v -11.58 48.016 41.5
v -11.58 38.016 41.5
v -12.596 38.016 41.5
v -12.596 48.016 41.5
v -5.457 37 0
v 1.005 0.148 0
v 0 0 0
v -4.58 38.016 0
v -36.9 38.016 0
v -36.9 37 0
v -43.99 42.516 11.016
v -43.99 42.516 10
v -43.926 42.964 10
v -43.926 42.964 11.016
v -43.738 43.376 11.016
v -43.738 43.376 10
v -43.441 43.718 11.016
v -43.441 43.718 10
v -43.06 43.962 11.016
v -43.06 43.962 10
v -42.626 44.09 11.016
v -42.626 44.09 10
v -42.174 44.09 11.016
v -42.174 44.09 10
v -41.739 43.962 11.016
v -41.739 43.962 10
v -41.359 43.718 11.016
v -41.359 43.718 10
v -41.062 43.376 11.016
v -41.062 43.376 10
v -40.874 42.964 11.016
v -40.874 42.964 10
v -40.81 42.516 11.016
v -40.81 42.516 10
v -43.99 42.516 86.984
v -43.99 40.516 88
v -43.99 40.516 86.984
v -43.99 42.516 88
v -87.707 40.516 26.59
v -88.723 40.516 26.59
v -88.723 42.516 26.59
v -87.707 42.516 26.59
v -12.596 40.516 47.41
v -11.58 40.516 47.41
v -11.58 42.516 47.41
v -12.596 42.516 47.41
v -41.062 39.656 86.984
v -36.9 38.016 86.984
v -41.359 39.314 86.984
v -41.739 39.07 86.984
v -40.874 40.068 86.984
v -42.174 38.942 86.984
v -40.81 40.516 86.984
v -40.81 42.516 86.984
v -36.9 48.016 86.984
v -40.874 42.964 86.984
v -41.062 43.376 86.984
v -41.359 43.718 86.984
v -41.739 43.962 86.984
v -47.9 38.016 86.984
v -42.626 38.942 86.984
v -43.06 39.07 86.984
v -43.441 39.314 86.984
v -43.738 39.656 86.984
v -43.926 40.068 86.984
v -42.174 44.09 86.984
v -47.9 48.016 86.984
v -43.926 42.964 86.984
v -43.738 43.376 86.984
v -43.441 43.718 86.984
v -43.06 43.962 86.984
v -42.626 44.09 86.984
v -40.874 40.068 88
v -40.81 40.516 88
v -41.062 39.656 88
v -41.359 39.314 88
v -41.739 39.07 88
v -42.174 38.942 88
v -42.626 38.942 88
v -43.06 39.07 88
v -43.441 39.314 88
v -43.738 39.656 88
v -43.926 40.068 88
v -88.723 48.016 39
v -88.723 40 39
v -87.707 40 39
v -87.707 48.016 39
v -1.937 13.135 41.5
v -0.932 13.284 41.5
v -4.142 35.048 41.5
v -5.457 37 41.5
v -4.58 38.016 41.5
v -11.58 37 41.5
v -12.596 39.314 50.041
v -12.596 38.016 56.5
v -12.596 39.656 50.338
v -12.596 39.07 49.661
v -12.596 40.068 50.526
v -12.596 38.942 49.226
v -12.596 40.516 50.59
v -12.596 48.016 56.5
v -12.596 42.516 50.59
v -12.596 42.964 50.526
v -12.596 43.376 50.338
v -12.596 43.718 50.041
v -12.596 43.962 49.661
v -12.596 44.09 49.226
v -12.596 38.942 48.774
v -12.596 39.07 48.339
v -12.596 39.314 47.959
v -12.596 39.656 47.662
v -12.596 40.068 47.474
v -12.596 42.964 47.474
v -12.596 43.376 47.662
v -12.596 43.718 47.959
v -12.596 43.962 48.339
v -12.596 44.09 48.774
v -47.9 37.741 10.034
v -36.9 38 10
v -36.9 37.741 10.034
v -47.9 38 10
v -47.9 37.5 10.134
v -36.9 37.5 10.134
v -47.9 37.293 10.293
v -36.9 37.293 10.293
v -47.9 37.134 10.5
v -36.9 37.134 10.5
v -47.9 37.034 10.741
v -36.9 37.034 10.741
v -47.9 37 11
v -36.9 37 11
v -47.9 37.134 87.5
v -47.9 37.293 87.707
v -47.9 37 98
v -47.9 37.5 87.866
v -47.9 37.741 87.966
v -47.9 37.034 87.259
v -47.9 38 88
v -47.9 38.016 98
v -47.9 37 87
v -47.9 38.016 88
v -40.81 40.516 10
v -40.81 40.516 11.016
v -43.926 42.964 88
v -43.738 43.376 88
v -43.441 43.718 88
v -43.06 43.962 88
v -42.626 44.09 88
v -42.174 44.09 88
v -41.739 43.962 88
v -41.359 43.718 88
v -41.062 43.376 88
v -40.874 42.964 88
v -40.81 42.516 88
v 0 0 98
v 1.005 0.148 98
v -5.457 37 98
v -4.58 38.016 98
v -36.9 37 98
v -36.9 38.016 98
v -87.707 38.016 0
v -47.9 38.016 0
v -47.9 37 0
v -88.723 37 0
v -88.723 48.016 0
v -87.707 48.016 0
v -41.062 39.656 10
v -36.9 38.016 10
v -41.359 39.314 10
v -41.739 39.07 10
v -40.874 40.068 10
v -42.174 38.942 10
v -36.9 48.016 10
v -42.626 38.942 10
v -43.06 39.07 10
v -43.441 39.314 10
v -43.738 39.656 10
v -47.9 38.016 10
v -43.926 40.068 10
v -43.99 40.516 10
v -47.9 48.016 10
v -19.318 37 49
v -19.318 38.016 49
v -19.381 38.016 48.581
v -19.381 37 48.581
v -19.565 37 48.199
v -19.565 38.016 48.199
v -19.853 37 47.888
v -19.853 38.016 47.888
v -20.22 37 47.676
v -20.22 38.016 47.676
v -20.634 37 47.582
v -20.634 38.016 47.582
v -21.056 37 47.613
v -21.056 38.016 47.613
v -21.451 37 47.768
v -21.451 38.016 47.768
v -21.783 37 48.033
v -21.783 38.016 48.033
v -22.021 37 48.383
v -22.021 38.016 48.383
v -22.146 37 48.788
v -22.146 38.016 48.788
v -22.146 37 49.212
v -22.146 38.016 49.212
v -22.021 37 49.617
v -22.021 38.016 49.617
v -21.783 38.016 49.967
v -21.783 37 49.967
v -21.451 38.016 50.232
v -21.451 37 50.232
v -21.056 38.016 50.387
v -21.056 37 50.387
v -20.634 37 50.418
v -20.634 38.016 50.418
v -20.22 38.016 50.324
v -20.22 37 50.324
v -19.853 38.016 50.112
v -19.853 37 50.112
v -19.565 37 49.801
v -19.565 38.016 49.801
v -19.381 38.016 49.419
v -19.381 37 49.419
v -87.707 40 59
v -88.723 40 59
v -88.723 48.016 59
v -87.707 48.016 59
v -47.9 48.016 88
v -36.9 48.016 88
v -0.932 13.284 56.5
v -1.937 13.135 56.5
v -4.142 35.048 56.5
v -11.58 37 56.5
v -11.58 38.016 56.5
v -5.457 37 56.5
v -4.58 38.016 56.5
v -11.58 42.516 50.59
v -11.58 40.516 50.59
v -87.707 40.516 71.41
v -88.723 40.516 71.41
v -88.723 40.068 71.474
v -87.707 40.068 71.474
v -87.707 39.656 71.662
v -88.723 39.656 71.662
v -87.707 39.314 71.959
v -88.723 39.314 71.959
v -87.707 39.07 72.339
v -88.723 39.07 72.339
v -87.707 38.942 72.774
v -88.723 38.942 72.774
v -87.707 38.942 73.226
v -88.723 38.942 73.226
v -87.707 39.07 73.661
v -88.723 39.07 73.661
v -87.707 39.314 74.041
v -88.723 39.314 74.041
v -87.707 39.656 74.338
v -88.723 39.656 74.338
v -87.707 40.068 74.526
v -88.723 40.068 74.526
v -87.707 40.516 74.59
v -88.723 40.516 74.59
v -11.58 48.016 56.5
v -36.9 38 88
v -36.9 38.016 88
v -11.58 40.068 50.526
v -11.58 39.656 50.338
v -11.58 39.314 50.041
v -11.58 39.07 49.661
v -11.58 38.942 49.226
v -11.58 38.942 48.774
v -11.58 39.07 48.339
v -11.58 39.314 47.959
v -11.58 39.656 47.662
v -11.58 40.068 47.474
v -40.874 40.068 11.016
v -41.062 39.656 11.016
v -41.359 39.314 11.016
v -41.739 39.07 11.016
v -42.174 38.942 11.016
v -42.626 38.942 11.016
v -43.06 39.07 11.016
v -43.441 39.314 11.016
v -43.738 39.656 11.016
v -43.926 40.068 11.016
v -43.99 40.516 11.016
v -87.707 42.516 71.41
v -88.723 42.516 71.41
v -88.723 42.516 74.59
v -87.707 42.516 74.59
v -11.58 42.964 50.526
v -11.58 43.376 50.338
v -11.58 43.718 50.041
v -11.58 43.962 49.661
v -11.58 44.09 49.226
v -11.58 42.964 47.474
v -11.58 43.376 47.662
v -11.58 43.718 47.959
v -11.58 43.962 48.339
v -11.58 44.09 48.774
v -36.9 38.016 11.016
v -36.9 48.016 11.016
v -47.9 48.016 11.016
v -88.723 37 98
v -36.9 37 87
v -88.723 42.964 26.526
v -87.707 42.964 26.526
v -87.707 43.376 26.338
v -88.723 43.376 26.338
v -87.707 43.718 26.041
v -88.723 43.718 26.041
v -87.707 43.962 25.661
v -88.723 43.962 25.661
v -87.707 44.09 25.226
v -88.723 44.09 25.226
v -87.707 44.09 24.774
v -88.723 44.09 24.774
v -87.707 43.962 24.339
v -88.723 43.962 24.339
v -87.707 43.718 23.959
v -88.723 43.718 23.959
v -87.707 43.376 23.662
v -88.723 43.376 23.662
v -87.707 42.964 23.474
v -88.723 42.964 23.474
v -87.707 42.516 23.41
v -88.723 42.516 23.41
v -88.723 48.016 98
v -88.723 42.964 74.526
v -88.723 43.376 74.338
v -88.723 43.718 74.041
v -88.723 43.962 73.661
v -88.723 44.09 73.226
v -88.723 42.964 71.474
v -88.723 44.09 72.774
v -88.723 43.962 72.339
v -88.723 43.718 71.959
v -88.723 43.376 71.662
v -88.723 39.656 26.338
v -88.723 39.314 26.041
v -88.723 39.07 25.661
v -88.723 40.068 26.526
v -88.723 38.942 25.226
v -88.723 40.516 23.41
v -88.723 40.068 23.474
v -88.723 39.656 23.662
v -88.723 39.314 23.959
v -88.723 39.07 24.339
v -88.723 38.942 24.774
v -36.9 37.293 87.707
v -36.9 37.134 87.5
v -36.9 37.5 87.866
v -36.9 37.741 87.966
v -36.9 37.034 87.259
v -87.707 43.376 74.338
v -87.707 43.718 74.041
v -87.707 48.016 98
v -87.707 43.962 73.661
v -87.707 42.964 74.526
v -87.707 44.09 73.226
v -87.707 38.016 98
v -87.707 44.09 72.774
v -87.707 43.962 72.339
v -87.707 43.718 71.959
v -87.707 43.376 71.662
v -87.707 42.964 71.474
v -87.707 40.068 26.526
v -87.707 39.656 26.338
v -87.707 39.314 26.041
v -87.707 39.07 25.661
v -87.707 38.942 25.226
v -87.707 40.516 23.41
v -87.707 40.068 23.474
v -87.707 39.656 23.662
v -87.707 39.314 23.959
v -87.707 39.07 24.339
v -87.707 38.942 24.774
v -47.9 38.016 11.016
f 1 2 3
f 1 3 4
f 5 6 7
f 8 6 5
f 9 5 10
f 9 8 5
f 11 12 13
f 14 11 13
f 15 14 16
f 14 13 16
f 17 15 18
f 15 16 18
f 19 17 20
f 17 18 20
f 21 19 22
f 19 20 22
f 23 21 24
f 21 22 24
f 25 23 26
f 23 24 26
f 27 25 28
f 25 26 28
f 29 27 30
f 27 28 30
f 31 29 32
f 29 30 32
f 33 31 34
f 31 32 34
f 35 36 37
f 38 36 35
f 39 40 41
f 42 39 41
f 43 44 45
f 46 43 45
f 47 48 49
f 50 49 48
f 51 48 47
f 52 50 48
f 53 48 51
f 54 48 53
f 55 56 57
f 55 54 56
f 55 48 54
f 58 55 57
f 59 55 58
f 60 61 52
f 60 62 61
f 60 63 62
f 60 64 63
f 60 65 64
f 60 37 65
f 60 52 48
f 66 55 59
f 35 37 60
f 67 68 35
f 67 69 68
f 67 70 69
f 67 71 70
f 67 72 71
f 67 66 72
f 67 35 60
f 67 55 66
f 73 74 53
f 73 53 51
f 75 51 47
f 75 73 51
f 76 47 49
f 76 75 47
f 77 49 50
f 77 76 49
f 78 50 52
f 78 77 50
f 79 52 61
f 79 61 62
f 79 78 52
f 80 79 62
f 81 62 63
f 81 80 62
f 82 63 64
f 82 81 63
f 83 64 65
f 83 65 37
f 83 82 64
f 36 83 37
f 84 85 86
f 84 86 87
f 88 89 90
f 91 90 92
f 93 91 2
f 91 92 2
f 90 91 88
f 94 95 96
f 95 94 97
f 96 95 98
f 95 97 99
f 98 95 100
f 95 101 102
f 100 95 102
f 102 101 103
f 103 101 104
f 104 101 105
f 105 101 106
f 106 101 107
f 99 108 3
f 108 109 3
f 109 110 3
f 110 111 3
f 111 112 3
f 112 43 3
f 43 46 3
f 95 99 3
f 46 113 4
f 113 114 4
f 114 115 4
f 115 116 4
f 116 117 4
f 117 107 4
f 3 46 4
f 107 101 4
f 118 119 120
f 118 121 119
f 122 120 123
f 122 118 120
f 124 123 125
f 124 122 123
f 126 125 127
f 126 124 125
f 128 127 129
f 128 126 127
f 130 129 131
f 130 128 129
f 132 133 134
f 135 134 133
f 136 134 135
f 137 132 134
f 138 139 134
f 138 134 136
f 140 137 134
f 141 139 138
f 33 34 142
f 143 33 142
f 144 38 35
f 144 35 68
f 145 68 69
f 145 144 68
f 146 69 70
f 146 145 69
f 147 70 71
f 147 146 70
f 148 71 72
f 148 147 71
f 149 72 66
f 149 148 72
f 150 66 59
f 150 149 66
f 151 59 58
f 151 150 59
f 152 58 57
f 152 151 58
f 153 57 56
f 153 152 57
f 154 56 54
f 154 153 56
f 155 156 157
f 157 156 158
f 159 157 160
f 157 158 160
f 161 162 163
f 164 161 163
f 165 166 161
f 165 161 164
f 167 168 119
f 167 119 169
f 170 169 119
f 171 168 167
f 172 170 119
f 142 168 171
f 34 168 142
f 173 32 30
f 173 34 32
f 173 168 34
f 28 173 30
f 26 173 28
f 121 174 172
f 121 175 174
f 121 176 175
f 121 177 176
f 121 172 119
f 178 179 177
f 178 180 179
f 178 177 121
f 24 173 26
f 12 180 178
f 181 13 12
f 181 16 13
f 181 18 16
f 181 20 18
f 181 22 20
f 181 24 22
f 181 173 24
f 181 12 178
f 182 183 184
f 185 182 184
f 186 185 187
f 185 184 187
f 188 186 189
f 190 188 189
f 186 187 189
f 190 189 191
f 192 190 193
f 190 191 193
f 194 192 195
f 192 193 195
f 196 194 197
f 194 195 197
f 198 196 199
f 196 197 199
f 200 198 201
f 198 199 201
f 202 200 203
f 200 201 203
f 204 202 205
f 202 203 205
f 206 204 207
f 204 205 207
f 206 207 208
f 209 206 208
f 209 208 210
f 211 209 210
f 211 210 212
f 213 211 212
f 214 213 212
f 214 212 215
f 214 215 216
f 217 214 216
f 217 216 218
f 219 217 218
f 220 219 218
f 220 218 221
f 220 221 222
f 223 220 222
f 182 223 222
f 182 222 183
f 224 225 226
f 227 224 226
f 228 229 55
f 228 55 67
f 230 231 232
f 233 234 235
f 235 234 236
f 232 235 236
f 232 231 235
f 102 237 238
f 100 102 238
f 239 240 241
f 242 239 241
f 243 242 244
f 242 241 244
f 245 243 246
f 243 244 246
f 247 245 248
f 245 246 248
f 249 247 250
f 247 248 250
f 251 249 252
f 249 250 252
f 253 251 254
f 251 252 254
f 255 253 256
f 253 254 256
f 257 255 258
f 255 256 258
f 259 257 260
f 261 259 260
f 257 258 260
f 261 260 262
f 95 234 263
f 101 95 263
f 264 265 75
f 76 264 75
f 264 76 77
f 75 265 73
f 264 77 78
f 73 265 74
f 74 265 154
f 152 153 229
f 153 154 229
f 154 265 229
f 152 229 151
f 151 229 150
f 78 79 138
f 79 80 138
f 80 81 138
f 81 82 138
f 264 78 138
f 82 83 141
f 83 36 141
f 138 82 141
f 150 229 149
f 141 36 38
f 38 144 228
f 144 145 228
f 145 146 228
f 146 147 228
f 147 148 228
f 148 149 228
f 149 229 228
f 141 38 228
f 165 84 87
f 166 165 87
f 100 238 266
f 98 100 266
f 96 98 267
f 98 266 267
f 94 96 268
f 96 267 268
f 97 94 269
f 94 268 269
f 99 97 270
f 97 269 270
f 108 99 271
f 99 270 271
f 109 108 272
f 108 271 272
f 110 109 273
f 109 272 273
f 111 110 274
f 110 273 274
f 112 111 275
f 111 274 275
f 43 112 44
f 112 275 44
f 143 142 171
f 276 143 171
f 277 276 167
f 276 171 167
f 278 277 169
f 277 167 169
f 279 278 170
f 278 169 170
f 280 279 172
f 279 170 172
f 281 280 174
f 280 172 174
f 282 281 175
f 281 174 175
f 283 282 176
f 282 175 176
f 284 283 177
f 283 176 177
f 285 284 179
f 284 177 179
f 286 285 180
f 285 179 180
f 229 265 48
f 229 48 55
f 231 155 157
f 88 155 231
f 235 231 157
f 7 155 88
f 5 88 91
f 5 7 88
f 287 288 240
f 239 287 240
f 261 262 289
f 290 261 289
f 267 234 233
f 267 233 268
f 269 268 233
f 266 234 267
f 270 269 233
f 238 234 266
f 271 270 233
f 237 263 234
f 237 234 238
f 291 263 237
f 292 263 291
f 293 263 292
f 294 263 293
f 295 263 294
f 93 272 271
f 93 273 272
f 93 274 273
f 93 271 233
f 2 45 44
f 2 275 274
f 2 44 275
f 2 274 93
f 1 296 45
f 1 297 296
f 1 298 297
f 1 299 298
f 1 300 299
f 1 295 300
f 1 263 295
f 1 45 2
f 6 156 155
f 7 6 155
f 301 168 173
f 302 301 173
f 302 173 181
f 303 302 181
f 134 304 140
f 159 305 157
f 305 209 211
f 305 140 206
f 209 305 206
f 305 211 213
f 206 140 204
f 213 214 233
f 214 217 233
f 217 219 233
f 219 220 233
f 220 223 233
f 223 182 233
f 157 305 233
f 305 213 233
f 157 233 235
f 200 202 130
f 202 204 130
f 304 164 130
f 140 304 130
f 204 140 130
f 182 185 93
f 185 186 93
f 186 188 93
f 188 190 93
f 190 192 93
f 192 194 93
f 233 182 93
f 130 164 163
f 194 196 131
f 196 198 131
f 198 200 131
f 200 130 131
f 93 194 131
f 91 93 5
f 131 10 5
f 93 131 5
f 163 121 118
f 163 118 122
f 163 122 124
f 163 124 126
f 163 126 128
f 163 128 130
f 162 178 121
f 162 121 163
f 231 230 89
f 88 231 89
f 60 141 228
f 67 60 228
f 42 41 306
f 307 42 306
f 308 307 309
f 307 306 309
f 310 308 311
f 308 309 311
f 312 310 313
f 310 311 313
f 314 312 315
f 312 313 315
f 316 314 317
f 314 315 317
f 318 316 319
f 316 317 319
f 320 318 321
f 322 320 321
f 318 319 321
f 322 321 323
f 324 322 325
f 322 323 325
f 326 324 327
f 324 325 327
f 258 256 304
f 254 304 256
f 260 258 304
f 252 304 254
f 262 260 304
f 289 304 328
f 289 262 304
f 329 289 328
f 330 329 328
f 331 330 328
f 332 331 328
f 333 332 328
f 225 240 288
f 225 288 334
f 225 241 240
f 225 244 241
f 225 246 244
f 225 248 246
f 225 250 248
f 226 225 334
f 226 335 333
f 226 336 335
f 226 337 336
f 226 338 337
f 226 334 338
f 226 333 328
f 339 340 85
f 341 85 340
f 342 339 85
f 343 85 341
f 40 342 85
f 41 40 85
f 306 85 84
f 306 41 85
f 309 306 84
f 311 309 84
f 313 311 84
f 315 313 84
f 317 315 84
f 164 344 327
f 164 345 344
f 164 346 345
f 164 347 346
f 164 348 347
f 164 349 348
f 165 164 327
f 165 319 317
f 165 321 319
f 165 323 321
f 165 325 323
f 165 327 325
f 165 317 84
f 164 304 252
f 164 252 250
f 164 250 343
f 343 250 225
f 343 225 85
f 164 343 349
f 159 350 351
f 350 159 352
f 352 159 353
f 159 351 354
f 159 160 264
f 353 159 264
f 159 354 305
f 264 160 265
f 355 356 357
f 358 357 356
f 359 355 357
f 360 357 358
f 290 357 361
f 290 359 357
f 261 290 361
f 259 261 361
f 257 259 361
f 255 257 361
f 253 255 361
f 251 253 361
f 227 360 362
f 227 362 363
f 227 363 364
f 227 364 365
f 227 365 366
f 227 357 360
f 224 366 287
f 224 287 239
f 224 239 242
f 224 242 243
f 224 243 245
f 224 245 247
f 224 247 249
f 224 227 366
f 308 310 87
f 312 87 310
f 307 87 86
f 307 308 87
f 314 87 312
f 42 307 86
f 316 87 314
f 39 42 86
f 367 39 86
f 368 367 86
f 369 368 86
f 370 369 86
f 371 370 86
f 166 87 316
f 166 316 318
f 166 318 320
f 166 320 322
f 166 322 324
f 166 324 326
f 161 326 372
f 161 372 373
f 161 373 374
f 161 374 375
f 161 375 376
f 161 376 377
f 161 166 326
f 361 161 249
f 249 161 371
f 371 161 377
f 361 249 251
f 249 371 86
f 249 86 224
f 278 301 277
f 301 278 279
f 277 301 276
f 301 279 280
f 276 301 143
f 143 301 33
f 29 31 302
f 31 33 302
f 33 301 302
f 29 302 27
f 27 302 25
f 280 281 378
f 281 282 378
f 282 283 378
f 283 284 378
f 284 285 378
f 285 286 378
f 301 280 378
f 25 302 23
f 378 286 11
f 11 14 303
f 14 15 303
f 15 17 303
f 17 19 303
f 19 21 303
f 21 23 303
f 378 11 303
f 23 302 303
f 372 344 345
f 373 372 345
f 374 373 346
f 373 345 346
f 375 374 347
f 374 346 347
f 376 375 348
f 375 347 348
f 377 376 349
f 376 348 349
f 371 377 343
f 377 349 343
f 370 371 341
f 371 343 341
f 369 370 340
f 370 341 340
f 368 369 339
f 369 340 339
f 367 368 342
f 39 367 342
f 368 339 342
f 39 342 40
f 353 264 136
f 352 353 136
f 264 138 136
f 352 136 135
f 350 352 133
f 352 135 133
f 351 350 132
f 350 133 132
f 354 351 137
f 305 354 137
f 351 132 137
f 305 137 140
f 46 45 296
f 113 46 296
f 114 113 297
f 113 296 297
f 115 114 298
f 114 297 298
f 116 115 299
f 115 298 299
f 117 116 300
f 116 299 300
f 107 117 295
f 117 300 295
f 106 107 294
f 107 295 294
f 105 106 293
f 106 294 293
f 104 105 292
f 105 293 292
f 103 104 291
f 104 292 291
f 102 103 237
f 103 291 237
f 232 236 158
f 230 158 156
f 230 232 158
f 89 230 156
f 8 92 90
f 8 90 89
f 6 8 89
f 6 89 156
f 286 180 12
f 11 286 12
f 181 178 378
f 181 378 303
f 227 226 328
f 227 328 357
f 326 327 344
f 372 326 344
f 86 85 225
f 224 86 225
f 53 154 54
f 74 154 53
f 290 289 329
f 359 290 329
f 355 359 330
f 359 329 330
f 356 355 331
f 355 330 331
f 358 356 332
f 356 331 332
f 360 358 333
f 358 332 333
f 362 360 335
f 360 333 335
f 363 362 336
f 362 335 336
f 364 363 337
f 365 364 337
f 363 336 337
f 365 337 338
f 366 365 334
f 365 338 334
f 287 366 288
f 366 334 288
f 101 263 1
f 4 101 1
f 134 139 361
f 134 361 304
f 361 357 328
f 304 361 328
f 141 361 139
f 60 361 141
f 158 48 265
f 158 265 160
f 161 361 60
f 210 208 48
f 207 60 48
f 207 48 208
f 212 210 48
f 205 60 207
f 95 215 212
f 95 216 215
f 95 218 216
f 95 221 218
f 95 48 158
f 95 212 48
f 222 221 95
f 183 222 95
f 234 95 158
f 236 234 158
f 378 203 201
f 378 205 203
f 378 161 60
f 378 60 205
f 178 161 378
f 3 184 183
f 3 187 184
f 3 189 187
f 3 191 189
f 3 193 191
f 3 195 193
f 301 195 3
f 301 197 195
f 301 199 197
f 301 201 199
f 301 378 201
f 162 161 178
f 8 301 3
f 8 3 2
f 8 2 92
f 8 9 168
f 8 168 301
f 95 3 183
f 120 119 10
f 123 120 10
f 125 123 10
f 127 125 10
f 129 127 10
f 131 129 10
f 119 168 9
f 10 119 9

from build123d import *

# Parameters (mm, degrees)
BOSS_EXTRUDE1_DEPTH = 98
CUT_EXTRUDE1_REACH  = 40.016
SKETCH2_W           = 11
SKETCH2_H           = 10
SKETCH4_W           = 11
SKETCH4_H           = 10
BOSS_EXTRUDE2_DEPTH = 1.016
FILLET2_R           = 1
CUT_EXTRUDE2_REACH  = 40.016
SKETCH6_R           = 1.4224
FILLET4_R           = 1
CUT_EXTRUDE4_REACH  = 91.728
SKETCH8_W           = 20
SKETCH8_H           = 8.016
CUT_EXTRUDE5_REACH  = 90.79
SKETCH9_W           = 15
SKETCH9_H           = 22
CUT_EXTRUDE6_REACH  = 40.016
SKETCH11_W          = 15
SKETCH11_H          = 10
BOSS_EXTRUDE4_DEPTH = 1.016
CUT_EXTRUDE7_REACH  = 79.143


with BuildPart() as part:
    # Sketch1 → Boss-Extrude1 (new body)
    with BuildSketch(Plane.XY):
        Polygon((0, 0), (-5.457086284, 37), (-87.707086284, 37), (-88.723086284, 37), (-88.723086284, 48.016), (-87.707086284, 48.016), (-87.707086284, 38.016), (-4.579943874, 38.016), (1.005126579, 0.148244932), align=None)
    extrude(amount=BOSS_EXTRUDE1_DEPTH)

    # Sketch2 → Cut-Extrude1 (cut, up to next)
    with BuildSketch(Plane(origin=(0, 38.016, 0), x_dir=(1, 0, 0), z_dir=(0, 1, 0)), mode=Mode.PRIVATE) as cut_extrude1_sk1:
        with Locations((-42.399943874, -5)):
            Rectangle(SKETCH2_W, SKETCH2_H)
    cut_extrude1_tool1 = extrude(cut_extrude1_sk1.sketch, amount=-CUT_EXTRUDE1_REACH, mode=Mode.PRIVATE) & part.part
    add(cut_extrude1_tool1.solids().sort_by_distance((-42.399944, 38.016, 5))[0], mode=Mode.SUBTRACT)
    # Sketch2 → Cut-Extrude1 (cut, up to next)
    with BuildSketch(Plane(origin=(0, 38.016, 0), x_dir=(1, 0, 0), z_dir=(0, 1, 0)), mode=Mode.PRIVATE) as cut_extrude1_sk2:
        with Locations((-42.399943874, -93)):
            Rectangle(SKETCH2_W, SKETCH2_H)
    cut_extrude1_tool2 = extrude(cut_extrude1_sk2.sketch, amount=-CUT_EXTRUDE1_REACH, mode=Mode.PRIVATE) & part.part
    add(cut_extrude1_tool2.solids().sort_by_distance((-42.399944, 38.016, 93))[0], mode=Mode.SUBTRACT)

    # Sketch4 → Boss-Extrude2 (add)
    with BuildSketch(Plane(origin=(0, 0, 10), x_dir=(-1, 0, 0), z_dir=(0, 0, -1))):
        with Locations((42.399943874, 43.016)):
            Rectangle(SKETCH4_W, SKETCH4_H)
        with BuildLine():
            Line((43.989943874, 40.516), (43.989943874, 42.516))
            ThreePointArc((43.989943874, 42.516), (42.399943874, 44.106), (40.809943874, 42.516))
            Line((40.809943874, 42.516), (40.809943874, 40.516))
            ThreePointArc((40.809943874, 40.516), (42.399943874, 38.926), (43.989943874, 40.516))
        make_face(mode=Mode.SUBTRACT)
    boss_extrude2 = extrude(amount=-BOSS_EXTRUDE2_DEPTH)

    # Fillet2
    fillet2_edges = [part.edges().sort_by_distance(p)[0] for p in [
        (-42.399943874, 37, 10),
    ]]
    fillet(fillet2_edges, radius=FILLET2_R)

    # Sketch6 → Cut-Extrude2 (cut, up to next)
    with BuildSketch(Plane(origin=(0, 38.016, 0), x_dir=(1, 0, 0), z_dir=(0, 1, 0)), mode=Mode.PRIVATE) as cut_extrude2_sk1:
        with Locations((-20.739943874, -49)):
            Circle(SKETCH6_R)
    cut_extrude2_tool1 = extrude(cut_extrude2_sk1.sketch, amount=-CUT_EXTRUDE2_REACH, mode=Mode.PRIVATE) & part.part
    add(cut_extrude2_tool1.solids().sort_by_distance((-20.739944, 38.016, 49))[0], mode=Mode.SUBTRACT)

    # Mirror4: Boss-Extrude2 across plane
    add(boss_extrude2.mirror(Plane.XY.offset(49)))

    # Fillet4
    fillet4_edges = [part.edges().sort_by_distance(p)[0] for p in [
        (-42.399943874, 37, 88),
    ]]
    fillet(fillet4_edges, radius=FILLET4_R)

    # Sketch8 → Cut-Extrude4 (cut, up to next)
    with BuildSketch(Plane.ZY.offset(88.723086284), mode=Mode.PRIVATE) as cut_extrude4_sk1:
        with BuildLine():
            Line((23.41, 42.516), (23.41, 40.516))
            ThreePointArc((23.41, 40.516), (25, 38.926), (26.59, 40.516))
            Line((26.59, 40.516), (26.59, 42.516))
            ThreePointArc((26.59, 42.516), (25, 44.106), (23.41, 42.516))
        make_face()
    cut_extrude4_tool1 = extrude(cut_extrude4_sk1.sketch, amount=-CUT_EXTRUDE4_REACH, mode=Mode.PRIVATE) & part.part
    add(cut_extrude4_tool1.solids().sort_by_distance((-88.723086, 41.516, 25))[0], mode=Mode.SUBTRACT)
    # Sketch8 → Cut-Extrude4 (cut, up to next)
    with BuildSketch(Plane.ZY.offset(88.723086284), mode=Mode.PRIVATE) as cut_extrude4_sk2:
        with BuildLine():
            Line((71.41, 42.516), (71.41, 40.516))
            ThreePointArc((71.41, 40.516), (73, 38.926), (74.59, 40.516))
            Line((74.59, 40.516), (74.59, 42.516))
            ThreePointArc((74.59, 42.516), (73, 44.106), (71.41, 42.516))
        make_face()
    cut_extrude4_tool2 = extrude(cut_extrude4_sk2.sketch, amount=-CUT_EXTRUDE4_REACH, mode=Mode.PRIVATE) & part.part
    add(cut_extrude4_tool2.solids().sort_by_distance((-88.723086, 41.516, 73))[0], mode=Mode.SUBTRACT)
    # Sketch8 → Cut-Extrude4 (cut, up to next)
    with BuildSketch(Plane.ZY.offset(88.723086284), mode=Mode.PRIVATE) as cut_extrude4_sk3:
        with Locations((49, 44.008)):
            Rectangle(SKETCH8_W, SKETCH8_H)
    cut_extrude4_tool3 = extrude(cut_extrude4_sk3.sketch, amount=-CUT_EXTRUDE4_REACH, mode=Mode.PRIVATE) & part.part
    add(cut_extrude4_tool3.solids().sort_by_distance((-88.723086, 44.008, 49))[0], mode=Mode.SUBTRACT)

    # Sketch9 → Cut-Extrude5 (cut, up to next)
    with BuildSketch(Plane(origin=(1.005126579, 0.148244932, 0), x_dir=(0, 0, -1), z_dir=(0.989297814, 0.145910366, 0)), mode=Mode.PRIVATE) as cut_extrude5_sk1:
        with Locations((-49, 24.27740699)):
            Rectangle(SKETCH9_W, SKETCH9_H)
    cut_extrude5_tool1 = extrude(cut_extrude5_sk1.sketch, amount=-CUT_EXTRUDE5_REACH, mode=Mode.PRIVATE) & part.part
    add(cut_extrude5_tool1.solids().sort_by_distance((-2.537199, 24.165831, 49))[0], mode=Mode.SUBTRACT)

    # Sketch10 → Cut-Extrude6 (cut, up to next)
    with BuildSketch(Plane(origin=(0, 38.016, 0), x_dir=(1, 0, 0), z_dir=(0, 1, 0)), mode=Mode.PRIVATE) as cut_extrude6_sk1:
        Polygon((-4.579943874, -56.5), (-11.579943874, -56.5), (-11.579943874, -41.5), (-4.579943874, -41.5), (-1.579943874, -41.5), (-1.579943874, -56.5), align=None)
    cut_extrude6_tool1 = extrude(cut_extrude6_sk1.sketch, amount=-CUT_EXTRUDE6_REACH, mode=Mode.PRIVATE) & part.part
    add(cut_extrude6_tool1.solids().sort_by_distance((-6.579944, 38.016, 49))[0], mode=Mode.SUBTRACT)

    # Sketch11 → Boss-Extrude4 (add)
    with BuildSketch(Plane(origin=(-11.579943874, 0, 0), x_dir=(0, 0, -1), z_dir=(1, 0, 0))):
        with Locations((-49, 43.016)):
            Rectangle(SKETCH11_W, SKETCH11_H)
    extrude(amount=-BOSS_EXTRUDE4_DEPTH)

    # Sketch12 → Cut-Extrude7 (cut, up to next)
    with BuildSketch(Plane(origin=(-11.579943874, 0, 0), x_dir=(0, 0, -1), z_dir=(1, 0, 0)), mode=Mode.PRIVATE) as cut_extrude7_sk1:
        with BuildLine():
            Line((-50.59, 42.516), (-50.59, 40.516))
            ThreePointArc((-50.59, 40.516), (-49, 38.926), (-47.41, 40.516))
            Line((-47.41, 40.516), (-47.41, 42.516))
            ThreePointArc((-47.41, 42.516), (-49, 44.106), (-50.59, 42.516))
        make_face()
    cut_extrude7_tool1 = extrude(cut_extrude7_sk1.sketch, amount=-CUT_EXTRUDE7_REACH, mode=Mode.PRIVATE) & part.part
    add(cut_extrude7_tool1.solids().sort_by_distance((-11.579944, 41.516, 49))[0], mode=Mode.SUBTRACT)


solid = part.part
